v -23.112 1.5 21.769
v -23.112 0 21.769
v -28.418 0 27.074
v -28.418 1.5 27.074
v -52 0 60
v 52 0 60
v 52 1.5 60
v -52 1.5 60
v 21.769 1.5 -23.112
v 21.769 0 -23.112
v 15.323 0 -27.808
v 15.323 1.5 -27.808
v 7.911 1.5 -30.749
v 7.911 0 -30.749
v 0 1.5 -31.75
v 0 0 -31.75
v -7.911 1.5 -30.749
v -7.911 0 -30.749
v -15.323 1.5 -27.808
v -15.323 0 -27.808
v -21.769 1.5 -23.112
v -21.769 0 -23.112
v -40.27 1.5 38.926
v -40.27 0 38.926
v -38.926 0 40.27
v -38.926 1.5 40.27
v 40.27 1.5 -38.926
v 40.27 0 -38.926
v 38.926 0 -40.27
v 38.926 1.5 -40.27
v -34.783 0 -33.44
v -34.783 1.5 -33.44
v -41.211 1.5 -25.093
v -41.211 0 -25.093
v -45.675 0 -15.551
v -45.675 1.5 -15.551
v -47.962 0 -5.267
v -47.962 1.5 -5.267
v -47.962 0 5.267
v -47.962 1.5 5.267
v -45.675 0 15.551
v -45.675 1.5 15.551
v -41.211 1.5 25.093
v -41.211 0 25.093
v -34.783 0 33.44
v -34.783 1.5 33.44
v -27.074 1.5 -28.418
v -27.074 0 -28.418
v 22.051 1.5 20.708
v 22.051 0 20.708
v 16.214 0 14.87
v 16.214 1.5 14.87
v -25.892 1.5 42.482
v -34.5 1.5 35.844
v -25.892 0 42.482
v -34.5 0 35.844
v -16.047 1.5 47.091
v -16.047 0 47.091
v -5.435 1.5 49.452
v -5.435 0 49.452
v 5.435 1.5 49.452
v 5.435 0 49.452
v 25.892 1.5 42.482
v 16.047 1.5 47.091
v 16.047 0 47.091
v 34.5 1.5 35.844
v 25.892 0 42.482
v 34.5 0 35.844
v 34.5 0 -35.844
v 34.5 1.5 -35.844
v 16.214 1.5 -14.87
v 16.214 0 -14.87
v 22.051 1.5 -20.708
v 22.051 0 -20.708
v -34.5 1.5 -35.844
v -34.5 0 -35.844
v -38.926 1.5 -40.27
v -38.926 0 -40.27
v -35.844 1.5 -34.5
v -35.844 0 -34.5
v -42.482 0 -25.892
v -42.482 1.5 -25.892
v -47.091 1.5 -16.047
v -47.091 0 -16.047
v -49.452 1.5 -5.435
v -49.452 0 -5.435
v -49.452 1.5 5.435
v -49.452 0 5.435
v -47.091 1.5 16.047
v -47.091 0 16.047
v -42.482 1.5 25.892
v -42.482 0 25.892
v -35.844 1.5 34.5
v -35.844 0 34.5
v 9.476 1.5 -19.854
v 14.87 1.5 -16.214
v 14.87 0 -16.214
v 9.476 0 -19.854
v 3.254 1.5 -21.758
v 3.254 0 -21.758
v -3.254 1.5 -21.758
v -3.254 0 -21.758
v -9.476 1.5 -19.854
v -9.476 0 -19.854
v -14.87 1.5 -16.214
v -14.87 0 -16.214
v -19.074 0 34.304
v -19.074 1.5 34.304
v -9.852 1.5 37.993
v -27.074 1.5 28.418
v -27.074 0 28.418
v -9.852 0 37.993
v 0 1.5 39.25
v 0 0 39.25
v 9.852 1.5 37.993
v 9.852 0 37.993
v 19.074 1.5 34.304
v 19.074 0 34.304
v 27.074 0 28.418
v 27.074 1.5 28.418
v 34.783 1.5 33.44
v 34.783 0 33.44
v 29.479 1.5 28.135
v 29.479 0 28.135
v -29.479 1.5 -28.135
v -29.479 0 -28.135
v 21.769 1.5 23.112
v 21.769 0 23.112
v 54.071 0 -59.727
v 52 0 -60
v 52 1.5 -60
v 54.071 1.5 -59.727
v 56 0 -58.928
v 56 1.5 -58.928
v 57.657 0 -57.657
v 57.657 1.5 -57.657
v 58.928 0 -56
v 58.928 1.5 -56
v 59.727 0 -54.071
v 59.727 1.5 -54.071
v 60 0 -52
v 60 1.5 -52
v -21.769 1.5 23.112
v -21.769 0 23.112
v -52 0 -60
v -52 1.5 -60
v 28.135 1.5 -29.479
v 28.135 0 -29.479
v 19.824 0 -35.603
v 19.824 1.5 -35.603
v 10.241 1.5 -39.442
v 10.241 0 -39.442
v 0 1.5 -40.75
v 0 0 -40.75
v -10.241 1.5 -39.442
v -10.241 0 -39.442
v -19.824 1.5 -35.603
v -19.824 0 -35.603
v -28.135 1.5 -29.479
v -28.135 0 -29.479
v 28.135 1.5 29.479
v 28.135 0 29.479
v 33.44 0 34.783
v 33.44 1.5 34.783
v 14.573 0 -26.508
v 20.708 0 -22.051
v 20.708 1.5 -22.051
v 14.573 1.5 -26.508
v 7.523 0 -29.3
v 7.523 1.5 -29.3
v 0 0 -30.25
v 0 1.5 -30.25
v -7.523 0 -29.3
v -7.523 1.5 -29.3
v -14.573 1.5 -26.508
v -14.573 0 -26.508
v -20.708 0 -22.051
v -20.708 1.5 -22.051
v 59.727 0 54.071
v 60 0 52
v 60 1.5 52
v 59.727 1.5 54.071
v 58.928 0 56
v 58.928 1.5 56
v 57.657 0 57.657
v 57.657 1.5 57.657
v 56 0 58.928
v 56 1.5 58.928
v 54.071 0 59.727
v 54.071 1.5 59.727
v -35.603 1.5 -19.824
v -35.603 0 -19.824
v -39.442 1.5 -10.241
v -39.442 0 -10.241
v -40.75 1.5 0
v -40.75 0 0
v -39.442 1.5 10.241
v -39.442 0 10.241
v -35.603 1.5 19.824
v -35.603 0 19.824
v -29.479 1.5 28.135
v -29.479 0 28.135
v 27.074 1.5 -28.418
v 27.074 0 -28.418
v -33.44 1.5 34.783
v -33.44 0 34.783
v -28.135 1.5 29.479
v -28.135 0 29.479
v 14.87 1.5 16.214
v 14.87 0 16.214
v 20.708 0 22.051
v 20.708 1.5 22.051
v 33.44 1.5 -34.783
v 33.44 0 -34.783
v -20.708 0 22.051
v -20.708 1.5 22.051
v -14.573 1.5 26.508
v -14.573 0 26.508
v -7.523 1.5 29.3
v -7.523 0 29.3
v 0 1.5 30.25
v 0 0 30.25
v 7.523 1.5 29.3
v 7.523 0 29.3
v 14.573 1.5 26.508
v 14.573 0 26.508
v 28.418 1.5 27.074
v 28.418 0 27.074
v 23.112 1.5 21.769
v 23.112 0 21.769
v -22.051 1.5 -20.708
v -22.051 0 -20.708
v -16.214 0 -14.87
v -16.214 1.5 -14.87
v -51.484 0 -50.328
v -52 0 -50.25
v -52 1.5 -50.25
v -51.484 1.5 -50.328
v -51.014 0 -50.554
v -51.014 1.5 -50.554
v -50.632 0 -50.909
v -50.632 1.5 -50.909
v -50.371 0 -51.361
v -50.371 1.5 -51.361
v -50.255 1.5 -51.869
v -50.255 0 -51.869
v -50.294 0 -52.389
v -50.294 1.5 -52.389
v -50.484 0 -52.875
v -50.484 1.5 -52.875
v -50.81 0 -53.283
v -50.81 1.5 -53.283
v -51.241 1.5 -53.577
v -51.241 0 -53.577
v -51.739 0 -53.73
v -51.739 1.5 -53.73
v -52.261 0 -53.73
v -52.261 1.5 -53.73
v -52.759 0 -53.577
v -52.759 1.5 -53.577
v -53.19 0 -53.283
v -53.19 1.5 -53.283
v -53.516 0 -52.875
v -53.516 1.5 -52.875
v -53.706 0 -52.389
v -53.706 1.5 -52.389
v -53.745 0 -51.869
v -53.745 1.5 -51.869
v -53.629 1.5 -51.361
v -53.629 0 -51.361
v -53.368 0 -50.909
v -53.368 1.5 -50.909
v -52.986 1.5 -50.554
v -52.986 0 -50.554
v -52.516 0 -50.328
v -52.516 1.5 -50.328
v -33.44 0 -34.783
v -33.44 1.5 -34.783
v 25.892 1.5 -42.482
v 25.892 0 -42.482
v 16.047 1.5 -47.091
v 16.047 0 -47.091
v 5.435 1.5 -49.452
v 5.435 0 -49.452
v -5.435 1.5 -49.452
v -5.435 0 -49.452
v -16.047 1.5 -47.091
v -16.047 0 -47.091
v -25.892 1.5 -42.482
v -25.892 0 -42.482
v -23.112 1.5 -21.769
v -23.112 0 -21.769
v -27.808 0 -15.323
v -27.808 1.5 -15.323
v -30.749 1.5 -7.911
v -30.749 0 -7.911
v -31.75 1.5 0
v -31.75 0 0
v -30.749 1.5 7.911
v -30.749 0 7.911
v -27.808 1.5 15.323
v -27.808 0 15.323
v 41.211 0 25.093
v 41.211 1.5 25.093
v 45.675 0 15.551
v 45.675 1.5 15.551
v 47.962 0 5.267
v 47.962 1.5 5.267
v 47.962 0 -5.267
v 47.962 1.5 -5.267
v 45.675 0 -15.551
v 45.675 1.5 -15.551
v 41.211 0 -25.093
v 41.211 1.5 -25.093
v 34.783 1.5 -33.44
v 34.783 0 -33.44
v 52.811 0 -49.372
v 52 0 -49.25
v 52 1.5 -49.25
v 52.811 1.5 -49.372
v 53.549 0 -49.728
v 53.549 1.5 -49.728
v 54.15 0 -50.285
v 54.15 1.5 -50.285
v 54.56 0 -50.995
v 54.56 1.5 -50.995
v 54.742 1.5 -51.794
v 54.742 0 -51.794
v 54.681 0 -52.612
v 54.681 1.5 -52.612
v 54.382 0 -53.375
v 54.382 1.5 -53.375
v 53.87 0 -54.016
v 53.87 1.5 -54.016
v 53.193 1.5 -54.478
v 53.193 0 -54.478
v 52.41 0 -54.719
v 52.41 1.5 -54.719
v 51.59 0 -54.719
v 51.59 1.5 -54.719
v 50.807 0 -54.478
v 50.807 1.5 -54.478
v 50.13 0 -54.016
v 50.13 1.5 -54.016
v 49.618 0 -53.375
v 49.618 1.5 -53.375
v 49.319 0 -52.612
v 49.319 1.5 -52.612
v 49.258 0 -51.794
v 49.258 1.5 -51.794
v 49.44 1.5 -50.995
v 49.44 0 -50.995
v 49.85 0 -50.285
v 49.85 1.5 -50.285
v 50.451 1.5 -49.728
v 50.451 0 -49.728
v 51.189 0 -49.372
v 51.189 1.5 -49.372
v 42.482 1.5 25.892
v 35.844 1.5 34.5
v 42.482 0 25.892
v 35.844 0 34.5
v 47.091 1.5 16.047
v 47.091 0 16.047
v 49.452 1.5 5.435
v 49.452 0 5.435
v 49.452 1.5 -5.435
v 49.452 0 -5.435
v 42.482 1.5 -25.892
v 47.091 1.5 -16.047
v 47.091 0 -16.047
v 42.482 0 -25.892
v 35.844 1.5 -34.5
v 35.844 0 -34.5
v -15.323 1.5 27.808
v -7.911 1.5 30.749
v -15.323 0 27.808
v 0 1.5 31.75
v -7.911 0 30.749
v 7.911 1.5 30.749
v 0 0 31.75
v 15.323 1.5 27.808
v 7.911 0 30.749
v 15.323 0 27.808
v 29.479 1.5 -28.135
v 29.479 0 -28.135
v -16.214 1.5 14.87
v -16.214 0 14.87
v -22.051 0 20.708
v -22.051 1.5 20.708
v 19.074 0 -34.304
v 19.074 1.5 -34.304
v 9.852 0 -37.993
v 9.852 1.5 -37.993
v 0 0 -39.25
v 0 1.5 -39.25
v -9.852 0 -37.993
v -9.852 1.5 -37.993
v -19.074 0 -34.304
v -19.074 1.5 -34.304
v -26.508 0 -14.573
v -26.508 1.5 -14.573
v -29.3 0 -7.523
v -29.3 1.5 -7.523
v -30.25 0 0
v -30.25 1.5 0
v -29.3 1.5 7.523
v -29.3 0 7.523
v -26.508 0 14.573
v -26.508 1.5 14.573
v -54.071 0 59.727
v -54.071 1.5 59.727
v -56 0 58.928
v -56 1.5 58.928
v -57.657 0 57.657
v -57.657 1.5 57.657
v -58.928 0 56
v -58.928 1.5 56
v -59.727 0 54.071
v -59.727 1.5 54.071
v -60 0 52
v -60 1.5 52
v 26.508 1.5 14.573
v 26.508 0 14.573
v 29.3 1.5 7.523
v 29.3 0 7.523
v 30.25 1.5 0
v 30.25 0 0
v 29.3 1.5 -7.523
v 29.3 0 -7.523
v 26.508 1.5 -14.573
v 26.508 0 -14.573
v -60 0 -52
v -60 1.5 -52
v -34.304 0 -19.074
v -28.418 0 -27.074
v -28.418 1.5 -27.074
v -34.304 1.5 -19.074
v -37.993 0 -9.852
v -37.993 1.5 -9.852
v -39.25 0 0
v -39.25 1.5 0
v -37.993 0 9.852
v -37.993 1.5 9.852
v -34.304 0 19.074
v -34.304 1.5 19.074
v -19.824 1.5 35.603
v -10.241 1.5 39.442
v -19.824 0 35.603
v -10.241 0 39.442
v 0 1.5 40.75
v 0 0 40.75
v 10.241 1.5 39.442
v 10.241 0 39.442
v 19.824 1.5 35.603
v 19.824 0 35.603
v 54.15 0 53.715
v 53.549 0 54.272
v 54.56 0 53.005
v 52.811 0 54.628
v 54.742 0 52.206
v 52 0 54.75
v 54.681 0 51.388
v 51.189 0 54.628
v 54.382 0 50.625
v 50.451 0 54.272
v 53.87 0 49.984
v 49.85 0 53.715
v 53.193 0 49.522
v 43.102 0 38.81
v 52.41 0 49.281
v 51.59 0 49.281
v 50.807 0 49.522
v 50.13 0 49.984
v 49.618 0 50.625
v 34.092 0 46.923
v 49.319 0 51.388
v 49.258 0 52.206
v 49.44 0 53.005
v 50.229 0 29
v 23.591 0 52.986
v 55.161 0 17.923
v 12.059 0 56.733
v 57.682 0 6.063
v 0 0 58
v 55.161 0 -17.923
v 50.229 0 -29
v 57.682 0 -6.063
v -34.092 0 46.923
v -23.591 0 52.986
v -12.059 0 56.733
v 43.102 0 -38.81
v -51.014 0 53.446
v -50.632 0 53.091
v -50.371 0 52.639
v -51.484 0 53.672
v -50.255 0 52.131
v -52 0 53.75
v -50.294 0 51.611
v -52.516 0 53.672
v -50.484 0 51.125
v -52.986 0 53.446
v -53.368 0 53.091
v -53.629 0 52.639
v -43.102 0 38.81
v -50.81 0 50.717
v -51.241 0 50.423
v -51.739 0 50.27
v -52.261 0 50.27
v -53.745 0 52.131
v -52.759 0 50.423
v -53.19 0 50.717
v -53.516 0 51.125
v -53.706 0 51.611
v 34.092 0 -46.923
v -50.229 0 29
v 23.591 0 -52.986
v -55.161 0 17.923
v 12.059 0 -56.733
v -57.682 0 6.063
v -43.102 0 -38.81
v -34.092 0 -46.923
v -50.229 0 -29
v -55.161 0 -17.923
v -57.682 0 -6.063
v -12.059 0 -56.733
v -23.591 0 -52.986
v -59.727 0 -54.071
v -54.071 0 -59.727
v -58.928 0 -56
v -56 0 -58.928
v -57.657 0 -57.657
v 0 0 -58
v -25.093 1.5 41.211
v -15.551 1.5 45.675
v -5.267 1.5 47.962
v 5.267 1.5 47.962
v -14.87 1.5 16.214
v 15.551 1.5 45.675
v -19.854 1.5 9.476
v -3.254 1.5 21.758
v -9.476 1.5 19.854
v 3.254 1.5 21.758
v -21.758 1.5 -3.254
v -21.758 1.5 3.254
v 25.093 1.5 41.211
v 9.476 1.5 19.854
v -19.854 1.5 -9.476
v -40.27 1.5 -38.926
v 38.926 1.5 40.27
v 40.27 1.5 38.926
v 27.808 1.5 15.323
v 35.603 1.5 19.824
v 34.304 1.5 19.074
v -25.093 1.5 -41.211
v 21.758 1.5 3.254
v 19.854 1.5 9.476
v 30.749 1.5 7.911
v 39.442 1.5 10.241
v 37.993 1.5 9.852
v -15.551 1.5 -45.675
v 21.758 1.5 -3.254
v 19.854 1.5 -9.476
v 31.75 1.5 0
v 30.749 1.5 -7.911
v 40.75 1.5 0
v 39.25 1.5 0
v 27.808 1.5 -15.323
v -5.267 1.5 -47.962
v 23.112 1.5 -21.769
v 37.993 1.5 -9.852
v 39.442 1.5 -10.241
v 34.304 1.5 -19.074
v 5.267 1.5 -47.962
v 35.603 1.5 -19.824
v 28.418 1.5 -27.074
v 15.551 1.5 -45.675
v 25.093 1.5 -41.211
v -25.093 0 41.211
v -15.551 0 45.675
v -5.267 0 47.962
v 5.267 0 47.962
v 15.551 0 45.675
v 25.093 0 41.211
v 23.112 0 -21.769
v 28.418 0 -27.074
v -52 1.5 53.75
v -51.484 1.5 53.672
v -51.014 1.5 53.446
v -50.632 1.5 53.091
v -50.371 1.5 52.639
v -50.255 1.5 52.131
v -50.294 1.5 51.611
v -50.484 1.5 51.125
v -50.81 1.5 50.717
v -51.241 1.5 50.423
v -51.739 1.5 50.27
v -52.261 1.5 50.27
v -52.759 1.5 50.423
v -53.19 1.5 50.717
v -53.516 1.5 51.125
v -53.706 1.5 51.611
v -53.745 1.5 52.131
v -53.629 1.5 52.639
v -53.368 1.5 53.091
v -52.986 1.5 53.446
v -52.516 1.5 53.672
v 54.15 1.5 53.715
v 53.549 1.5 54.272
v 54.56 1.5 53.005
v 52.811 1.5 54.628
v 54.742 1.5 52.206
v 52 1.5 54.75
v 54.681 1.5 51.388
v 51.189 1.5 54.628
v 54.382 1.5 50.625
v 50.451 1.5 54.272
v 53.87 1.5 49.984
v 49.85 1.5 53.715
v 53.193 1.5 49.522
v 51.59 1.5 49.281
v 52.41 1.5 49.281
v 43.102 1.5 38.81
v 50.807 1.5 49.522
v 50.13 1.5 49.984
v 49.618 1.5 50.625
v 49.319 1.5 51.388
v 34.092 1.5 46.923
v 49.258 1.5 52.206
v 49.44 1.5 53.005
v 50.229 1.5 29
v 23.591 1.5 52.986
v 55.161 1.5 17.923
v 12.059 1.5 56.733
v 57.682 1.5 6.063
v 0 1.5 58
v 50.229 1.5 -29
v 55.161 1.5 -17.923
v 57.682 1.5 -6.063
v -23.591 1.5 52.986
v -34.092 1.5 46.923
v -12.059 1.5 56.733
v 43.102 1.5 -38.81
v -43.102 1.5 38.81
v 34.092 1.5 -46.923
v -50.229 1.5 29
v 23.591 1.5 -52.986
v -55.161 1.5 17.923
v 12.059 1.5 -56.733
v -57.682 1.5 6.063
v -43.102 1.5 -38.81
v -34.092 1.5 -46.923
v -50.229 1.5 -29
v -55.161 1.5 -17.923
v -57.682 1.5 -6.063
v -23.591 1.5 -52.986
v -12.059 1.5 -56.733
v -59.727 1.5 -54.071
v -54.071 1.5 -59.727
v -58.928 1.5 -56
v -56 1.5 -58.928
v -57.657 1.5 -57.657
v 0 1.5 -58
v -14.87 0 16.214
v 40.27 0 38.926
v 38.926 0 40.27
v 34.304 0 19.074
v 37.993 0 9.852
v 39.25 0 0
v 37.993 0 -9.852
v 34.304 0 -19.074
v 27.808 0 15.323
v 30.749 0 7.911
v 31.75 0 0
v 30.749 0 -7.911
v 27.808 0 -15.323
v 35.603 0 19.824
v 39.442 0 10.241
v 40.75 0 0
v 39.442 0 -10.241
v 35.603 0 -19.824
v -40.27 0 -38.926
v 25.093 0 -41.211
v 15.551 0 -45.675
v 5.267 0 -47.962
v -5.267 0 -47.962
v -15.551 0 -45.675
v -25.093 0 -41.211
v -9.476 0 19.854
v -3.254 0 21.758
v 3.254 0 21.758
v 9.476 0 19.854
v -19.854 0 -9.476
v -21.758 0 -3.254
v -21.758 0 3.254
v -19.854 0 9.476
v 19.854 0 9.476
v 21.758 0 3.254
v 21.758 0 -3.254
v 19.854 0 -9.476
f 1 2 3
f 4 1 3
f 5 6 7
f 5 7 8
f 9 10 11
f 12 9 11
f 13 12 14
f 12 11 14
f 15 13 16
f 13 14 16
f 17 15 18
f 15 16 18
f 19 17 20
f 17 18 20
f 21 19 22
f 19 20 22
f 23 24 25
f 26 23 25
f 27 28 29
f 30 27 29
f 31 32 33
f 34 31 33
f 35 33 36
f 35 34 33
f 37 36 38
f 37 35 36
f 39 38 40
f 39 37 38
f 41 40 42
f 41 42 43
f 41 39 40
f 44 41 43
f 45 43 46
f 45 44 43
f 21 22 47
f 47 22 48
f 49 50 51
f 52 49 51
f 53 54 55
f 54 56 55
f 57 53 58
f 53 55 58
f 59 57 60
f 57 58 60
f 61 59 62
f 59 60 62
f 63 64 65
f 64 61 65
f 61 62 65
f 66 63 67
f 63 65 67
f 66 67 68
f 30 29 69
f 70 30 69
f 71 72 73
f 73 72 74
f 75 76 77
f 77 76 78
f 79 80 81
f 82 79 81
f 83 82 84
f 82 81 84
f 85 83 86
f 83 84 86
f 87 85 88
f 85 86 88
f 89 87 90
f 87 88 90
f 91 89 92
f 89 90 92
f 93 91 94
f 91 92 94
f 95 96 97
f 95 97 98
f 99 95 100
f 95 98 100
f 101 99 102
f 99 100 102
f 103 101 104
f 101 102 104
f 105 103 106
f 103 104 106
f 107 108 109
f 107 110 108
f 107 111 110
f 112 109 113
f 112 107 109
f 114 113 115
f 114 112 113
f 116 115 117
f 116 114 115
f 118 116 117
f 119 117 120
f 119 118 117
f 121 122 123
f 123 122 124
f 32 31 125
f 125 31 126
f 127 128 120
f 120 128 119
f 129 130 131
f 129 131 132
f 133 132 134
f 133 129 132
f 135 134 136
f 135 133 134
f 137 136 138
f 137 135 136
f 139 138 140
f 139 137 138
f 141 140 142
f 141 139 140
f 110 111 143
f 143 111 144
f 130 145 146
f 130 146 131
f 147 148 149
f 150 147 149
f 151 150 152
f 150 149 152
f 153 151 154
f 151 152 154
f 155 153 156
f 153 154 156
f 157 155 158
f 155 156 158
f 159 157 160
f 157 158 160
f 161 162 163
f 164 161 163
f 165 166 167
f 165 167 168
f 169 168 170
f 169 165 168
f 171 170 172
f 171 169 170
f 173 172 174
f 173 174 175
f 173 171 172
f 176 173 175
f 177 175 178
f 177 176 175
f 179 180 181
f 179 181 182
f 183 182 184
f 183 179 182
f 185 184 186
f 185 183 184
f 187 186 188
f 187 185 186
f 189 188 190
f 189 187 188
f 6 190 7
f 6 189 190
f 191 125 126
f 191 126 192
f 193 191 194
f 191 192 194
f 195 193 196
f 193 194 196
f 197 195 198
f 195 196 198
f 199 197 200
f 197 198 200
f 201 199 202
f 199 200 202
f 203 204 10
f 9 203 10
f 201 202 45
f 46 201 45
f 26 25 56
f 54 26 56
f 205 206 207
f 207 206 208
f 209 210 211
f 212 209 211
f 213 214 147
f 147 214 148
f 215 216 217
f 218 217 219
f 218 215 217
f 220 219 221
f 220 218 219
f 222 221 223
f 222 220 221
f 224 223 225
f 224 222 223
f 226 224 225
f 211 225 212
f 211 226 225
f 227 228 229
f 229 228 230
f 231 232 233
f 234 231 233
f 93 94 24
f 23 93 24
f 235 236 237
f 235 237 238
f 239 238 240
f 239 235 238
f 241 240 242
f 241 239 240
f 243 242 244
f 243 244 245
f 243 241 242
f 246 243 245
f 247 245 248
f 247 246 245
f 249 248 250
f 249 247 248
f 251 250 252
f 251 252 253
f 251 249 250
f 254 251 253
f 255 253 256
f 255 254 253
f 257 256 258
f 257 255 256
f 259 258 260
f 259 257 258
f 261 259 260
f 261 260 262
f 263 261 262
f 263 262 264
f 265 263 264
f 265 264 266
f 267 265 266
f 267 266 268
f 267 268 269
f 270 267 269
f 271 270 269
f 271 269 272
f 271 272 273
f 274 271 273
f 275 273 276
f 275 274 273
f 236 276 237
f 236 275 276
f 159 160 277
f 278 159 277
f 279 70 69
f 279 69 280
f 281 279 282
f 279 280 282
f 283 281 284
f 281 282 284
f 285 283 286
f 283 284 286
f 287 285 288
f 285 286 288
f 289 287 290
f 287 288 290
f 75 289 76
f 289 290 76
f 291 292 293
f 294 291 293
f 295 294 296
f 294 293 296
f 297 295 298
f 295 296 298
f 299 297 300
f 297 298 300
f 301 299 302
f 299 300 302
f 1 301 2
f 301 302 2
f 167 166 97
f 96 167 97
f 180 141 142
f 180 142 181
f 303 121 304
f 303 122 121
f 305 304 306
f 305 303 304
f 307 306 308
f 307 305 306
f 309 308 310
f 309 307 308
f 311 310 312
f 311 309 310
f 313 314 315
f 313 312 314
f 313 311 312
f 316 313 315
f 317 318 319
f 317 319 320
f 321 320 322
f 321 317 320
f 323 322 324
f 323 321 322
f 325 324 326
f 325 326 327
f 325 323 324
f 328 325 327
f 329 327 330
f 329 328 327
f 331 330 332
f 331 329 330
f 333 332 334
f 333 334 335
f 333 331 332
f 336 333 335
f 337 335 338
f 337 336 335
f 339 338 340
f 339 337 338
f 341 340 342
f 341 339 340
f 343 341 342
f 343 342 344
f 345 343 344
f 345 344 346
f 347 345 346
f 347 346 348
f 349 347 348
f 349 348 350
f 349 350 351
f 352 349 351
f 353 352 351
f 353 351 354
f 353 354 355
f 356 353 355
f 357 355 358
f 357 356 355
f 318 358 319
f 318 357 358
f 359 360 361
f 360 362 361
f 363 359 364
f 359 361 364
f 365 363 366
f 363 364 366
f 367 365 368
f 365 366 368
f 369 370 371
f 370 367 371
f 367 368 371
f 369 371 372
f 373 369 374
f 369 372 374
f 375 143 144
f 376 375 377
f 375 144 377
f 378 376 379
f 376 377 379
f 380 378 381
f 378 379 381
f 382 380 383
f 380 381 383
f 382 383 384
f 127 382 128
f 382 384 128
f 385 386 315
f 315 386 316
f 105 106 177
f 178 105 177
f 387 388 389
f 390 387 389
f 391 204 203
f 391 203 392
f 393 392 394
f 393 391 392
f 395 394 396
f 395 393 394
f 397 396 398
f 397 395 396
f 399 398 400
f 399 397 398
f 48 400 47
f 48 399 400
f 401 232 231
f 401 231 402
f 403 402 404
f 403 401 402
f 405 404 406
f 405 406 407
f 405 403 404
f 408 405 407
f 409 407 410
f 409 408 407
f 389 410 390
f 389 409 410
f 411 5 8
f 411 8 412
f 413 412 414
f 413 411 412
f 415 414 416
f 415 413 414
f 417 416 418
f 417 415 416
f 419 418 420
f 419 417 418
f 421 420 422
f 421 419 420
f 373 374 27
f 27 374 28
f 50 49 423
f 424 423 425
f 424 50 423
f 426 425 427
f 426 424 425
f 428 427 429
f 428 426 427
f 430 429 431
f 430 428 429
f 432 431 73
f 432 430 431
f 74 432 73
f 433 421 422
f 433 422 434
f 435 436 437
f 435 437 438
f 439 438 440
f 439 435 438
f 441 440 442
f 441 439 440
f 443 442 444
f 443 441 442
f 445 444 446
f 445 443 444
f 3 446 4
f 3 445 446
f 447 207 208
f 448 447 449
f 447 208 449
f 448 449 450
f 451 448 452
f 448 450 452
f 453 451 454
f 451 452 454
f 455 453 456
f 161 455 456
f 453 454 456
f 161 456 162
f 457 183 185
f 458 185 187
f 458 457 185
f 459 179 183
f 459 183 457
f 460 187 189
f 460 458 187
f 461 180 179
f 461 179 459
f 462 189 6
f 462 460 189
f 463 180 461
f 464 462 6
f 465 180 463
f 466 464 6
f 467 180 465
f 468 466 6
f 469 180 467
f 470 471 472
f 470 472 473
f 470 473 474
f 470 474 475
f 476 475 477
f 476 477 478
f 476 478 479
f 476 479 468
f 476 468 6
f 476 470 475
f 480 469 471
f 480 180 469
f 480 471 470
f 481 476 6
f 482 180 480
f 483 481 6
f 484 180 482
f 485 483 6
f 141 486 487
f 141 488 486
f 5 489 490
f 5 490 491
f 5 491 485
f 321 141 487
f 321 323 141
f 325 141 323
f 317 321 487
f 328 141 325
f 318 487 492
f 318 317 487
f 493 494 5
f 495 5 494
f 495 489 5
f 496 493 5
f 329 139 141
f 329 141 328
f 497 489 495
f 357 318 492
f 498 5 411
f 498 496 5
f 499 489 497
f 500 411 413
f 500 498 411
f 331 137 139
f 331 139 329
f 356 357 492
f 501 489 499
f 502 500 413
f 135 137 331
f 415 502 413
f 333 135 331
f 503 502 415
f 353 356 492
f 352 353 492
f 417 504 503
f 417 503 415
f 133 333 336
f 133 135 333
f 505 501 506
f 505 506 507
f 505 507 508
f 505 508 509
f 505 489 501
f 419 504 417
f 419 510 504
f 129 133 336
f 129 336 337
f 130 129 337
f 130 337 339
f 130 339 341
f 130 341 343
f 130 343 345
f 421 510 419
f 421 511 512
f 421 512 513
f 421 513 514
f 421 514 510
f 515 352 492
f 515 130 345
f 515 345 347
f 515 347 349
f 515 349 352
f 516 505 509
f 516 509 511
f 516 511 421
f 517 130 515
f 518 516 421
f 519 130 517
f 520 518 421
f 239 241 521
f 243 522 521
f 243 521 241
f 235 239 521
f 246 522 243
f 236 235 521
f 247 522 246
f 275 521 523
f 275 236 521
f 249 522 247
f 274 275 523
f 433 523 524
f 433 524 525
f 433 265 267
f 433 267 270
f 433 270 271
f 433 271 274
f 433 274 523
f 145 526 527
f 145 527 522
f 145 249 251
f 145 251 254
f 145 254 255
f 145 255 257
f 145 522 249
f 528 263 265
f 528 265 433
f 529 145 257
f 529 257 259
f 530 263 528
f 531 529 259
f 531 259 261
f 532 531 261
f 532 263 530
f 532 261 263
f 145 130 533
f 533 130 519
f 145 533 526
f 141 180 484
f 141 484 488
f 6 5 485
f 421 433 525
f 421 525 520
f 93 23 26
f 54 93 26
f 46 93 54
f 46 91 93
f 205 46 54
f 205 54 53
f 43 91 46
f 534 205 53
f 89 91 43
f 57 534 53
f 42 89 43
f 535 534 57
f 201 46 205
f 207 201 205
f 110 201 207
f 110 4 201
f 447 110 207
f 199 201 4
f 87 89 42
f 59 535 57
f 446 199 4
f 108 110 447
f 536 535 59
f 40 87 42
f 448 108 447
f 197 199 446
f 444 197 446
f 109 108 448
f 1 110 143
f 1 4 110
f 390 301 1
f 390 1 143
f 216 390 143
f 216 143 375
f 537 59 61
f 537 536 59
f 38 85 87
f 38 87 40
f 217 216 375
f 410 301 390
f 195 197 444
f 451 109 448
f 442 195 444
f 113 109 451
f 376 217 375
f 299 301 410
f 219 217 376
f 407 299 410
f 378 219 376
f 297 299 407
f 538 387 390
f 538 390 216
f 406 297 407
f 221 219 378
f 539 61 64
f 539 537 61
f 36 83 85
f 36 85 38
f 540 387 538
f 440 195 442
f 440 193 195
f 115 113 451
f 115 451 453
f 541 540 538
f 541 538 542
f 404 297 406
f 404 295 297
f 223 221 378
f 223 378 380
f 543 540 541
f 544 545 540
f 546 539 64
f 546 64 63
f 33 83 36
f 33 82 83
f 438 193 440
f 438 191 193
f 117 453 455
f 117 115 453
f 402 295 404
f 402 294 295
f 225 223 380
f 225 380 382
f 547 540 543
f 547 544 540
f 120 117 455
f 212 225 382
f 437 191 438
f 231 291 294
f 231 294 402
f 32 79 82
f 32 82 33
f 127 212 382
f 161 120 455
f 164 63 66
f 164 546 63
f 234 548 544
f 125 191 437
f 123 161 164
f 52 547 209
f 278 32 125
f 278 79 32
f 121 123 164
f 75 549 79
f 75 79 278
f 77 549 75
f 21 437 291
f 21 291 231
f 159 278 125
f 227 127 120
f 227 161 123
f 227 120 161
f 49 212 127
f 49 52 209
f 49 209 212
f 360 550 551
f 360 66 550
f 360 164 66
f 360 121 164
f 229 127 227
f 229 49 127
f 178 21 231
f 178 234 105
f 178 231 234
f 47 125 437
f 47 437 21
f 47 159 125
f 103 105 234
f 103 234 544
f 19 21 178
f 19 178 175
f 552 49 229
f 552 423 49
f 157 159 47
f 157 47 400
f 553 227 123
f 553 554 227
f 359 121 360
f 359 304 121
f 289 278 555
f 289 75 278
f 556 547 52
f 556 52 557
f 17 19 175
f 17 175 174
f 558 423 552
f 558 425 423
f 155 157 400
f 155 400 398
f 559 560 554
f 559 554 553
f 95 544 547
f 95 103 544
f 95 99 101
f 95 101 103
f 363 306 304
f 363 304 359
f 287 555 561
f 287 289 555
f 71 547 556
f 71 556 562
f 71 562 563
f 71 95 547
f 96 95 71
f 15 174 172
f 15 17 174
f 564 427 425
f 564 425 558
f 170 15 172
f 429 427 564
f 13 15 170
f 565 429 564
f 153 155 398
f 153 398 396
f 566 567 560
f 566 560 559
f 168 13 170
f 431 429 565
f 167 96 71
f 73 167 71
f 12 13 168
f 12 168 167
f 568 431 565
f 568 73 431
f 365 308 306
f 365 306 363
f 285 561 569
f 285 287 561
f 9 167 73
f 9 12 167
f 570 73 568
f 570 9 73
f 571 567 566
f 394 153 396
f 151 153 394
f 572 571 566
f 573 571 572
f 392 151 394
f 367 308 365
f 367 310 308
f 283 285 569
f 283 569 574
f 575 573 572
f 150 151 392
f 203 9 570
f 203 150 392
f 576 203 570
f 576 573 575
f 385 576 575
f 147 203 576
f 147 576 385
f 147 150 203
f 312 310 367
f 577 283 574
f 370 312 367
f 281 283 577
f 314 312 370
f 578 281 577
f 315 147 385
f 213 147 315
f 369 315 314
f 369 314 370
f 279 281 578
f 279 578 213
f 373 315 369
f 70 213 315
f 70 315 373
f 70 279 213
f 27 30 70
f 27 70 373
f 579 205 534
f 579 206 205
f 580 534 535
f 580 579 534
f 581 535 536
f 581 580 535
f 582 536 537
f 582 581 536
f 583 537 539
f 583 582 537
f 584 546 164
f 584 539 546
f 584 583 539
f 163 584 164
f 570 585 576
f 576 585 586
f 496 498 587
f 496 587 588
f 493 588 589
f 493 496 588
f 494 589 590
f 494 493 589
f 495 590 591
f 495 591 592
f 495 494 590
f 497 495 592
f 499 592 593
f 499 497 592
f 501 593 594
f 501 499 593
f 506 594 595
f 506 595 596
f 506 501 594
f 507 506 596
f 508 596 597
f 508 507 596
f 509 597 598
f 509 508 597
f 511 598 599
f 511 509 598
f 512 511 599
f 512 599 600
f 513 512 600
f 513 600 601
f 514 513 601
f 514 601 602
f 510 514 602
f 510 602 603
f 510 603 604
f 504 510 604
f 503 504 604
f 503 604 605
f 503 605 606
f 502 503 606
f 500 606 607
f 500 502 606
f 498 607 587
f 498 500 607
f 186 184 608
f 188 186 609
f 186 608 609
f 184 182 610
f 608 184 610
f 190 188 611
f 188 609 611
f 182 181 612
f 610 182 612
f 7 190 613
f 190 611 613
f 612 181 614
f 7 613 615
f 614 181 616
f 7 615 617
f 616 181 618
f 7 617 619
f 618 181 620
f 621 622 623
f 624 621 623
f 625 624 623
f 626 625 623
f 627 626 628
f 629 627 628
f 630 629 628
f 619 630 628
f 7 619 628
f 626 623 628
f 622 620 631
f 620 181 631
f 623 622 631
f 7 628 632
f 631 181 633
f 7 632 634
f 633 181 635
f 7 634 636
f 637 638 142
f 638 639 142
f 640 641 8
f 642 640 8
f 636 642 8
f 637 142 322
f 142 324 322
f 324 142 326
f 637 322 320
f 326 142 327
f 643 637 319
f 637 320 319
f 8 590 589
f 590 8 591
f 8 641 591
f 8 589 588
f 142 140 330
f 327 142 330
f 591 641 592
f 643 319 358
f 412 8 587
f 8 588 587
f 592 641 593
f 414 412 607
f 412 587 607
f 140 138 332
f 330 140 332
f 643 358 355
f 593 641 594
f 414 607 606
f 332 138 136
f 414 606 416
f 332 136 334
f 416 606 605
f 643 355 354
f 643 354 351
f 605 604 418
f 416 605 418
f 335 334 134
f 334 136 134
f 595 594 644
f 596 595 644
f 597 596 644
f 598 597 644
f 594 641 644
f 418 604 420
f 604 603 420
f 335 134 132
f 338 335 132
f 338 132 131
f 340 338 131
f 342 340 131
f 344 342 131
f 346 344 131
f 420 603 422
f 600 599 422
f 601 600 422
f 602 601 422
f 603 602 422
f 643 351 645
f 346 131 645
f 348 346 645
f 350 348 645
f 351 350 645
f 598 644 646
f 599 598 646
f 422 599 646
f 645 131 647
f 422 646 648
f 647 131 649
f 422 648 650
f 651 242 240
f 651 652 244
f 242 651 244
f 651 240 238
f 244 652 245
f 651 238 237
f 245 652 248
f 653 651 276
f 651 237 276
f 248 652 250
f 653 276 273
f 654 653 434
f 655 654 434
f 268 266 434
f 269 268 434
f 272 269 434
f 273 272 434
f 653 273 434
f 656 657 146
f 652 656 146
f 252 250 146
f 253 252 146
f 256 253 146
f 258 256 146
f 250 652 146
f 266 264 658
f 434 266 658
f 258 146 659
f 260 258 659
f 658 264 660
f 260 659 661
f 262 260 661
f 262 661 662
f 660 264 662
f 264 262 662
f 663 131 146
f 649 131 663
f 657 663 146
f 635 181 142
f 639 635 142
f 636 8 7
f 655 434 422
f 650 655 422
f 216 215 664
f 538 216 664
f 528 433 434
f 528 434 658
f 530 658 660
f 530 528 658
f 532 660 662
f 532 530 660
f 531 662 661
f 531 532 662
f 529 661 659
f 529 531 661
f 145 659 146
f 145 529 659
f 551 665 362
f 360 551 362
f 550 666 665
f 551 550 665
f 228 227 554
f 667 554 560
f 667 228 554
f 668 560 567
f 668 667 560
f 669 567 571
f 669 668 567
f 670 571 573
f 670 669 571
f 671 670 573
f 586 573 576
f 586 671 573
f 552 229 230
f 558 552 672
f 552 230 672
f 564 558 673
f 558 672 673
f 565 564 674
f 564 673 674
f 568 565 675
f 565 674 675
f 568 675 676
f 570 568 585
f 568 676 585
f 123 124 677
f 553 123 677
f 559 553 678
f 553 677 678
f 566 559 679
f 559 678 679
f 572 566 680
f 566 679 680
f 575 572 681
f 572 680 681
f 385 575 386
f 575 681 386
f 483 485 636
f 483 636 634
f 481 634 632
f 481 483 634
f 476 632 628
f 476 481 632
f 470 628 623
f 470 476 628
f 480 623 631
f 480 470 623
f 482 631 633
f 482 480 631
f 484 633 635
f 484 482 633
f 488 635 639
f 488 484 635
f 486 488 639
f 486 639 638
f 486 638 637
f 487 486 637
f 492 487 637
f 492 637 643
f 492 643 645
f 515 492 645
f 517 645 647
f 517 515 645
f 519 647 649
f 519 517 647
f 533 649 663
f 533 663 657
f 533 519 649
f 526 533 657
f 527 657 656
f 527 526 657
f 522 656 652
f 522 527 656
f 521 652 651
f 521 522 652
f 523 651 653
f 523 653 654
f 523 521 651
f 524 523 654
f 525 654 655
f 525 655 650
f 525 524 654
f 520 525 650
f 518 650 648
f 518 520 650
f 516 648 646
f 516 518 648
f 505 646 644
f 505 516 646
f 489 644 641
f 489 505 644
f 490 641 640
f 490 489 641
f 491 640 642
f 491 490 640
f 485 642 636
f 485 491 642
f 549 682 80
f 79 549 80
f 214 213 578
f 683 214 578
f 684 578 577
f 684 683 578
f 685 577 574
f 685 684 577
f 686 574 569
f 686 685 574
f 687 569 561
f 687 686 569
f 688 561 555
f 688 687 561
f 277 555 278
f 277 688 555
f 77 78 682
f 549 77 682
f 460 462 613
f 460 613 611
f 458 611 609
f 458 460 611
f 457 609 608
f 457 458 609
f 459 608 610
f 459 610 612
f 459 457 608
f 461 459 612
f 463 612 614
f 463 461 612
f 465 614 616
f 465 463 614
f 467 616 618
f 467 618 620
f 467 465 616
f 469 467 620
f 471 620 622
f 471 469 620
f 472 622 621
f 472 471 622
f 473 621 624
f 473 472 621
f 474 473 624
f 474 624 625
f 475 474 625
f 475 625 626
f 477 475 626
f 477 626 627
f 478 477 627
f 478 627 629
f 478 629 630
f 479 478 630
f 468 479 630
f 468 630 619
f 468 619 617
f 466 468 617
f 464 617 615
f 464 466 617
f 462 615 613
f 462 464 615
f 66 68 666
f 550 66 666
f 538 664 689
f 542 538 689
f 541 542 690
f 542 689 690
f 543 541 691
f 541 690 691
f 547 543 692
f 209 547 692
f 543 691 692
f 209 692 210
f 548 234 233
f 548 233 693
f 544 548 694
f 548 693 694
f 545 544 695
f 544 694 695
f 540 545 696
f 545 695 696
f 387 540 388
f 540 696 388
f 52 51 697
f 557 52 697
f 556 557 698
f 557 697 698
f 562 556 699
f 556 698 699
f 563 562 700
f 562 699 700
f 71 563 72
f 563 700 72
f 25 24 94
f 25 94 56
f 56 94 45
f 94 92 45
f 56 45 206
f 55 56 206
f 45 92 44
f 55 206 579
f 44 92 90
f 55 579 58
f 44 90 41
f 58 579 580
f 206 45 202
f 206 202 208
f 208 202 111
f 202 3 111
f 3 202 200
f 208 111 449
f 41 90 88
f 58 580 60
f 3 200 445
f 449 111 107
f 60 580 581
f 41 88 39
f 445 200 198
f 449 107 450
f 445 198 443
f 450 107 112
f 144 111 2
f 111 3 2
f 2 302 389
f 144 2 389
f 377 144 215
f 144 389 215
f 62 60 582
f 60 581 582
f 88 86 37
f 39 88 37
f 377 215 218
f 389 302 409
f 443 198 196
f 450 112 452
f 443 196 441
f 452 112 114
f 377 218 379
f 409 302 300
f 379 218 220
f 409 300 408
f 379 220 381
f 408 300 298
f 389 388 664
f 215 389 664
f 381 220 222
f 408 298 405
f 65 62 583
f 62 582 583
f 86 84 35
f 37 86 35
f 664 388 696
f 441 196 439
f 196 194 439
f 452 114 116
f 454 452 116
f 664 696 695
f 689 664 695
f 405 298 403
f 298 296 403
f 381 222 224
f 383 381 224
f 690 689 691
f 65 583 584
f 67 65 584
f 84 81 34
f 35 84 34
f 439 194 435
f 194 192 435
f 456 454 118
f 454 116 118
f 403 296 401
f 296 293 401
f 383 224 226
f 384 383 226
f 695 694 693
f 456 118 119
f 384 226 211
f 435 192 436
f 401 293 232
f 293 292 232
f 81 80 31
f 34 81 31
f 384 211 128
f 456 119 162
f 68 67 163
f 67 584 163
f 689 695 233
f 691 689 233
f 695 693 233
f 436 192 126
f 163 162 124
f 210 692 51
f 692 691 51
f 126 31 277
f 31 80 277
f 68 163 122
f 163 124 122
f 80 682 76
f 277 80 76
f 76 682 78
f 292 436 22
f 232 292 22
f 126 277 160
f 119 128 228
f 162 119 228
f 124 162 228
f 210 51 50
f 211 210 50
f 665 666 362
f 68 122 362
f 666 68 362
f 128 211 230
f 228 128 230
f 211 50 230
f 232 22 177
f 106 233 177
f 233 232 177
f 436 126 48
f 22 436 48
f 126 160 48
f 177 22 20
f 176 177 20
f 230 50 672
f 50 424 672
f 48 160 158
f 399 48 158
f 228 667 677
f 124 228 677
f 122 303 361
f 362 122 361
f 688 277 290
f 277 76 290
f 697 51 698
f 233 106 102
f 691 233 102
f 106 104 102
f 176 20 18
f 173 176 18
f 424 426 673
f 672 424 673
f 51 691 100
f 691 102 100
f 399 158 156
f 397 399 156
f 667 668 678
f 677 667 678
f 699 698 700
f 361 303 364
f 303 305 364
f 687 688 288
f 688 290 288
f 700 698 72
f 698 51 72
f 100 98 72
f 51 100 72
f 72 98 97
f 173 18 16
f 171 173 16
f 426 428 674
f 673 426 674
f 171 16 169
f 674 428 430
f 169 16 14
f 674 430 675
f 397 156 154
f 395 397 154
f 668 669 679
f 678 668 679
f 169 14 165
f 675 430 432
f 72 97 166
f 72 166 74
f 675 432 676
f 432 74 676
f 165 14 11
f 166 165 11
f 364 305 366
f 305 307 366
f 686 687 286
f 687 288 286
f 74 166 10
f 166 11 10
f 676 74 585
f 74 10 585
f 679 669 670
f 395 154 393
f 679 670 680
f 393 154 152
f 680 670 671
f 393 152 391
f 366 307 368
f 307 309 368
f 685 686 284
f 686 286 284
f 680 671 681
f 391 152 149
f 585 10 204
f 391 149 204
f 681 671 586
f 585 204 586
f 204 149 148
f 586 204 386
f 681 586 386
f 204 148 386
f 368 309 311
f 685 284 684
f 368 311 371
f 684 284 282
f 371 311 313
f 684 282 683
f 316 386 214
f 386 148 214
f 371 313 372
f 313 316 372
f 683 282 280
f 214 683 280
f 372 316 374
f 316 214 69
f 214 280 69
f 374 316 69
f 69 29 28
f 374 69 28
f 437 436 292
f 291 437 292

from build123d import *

# Parameters (mm, degrees)
SKETCH_1_R      = 2.75
SKETCH_1_R_2    = 1.75
SKETCH_1_R_3    = 58
EXTRUDE_1_DEPTH = 1.5
SKETCH_2_R      = 22
EXTRUDE_2_DEPTH = 1.5
SKETCH_3_R      = 31.75
SKETCH_3_R_2    = 30.25
EXTRUDE_3_DEPTH = 1.5
SKETCH_4_R      = 40.75
SKETCH_4_R_2    = 39.25
EXTRUDE_4_DEPTH = 1.5
SKETCH_5_R      = 49.75
SKETCH_5_R_2    = 48.25
EXTRUDE_5_DEPTH = 1.5
SKETCH_5_2_R    = 49.75
SKETCH_5_2_R_2  = 48.25
EXTRUDE_6_DEPTH = 1.5
SKETCH_5_3_R    = 49.75
SKETCH_5_3_R_2  = 48.25
EXTRUDE_7_DEPTH = 1.5
EXTRUDE_8_DEPTH = 1.5
EXTRUDE_9_DEPTH = 1.5


with BuildPart() as part:
    # 草图1 → 凸台-拉伸1 (new body)
    with BuildSketch(Plane(origin=(0, 0, 0), x_dir=(1, 0, 0), z_dir=(0, 1, 0))):
        with BuildLine():
            Line((-52, 60), (52, 60))
            ThreePointArc((52, 60), (57.656854249, 57.656854249), (60, 52))
            Line((60, 52), (60, -52))
            ThreePointArc((60, -52), (57.656854249, -57.656854249), (52, -60))
            Line((52, -60), (-52, -60))
            ThreePointArc((-52, -60), (-57.656854249, -57.656854249), (-60, -52))
            Line((-60, -52), (-60, 52))
            ThreePointArc((-60, 52), (-57.656854249, 57.656854249), (-52, 60))
        make_face()
        with Locations((52, 52)):
            Circle(SKETCH_1_R, mode=Mode.SUBTRACT)
        with Locations((52, -52)):
            Circle(SKETCH_1_R, mode=Mode.SUBTRACT)
        with Locations((-52, 52)):
            Circle(SKETCH_1_R_2, mode=Mode.SUBTRACT)
        with Locations((-52, -52)):
            Circle(SKETCH_1_R_2, mode=Mode.SUBTRACT)
        Circle(SKETCH_1_R_3, mode=Mode.SUBTRACT)
    extrude(amount=EXTRUDE_1_DEPTH)


with BuildPart() as body_2:
    # 草图2 → 凸台-拉伸2 (new body)
    with BuildSketch(Plane(origin=(0, 0, 0), x_dir=(1, 0, 0), z_dir=(0, 1, 0))):
        Circle(SKETCH_2_R)
    extrude(amount=EXTRUDE_2_DEPTH)



with BuildPart() as body_3:
    # 草图3 → 凸台-拉伸3 (new body)
    with BuildSketch(Plane(origin=(0, 0, 0), x_dir=(1, 0, 0), z_dir=(0, 1, 0))):
        Circle(SKETCH_3_R)
        Circle(SKETCH_3_R_2, mode=Mode.SUBTRACT)
    extrude(amount=EXTRUDE_3_DEPTH)


with BuildPart() as body_4:
    # 草图4 → 凸台-拉伸4 (new body)
    with BuildSketch(Plane(origin=(0, 0, 0), x_dir=(1, 0, 0), z_dir=(0, 1, 0))):
        Circle(SKETCH_4_R)
        Circle(SKETCH_4_R_2, mode=Mode.SUBTRACT)
    extrude(amount=EXTRUDE_4_DEPTH)


with BuildPart() as body_5:
    # 草图5 → 凸台-拉伸5 (new body)
    with BuildSketch(Plane(origin=(0, 0, 0), x_dir=(1, 0, 0), z_dir=(0, 1, 0))):
        Circle(SKETCH_5_R)
        Circle(SKETCH_5_R_2, mode=Mode.SUBTRACT)
    extrude(amount=EXTRUDE_5_DEPTH)

    # 草图5<2> → 凸台-拉伸6 (add)
    with BuildSketch(Plane(origin=(0, 0, 0), x_dir=(1, 0, 0), z_dir=(0, 1, 0))):
        Circle(SKETCH_5_2_R)
        Circle(SKETCH_5_2_R_2, mode=Mode.SUBTRACT)
    extrude(amount=EXTRUDE_6_DEPTH)

    # 草图5<3> → 凸台-拉伸7 (add)
    with BuildSketch(Plane(origin=(0, 0, 0), x_dir=(1, 0, 0), z_dir=(0, 1, 0))):
        Circle(SKETCH_5_3_R)
        Circle(SKETCH_5_3_R_2, mode=Mode.SUBTRACT)
    extrude(amount=EXTRUDE_7_DEPTH)


with BuildPart() as body_2_1:
    add(body_2.part)

    add(body_3.part)  # 凸台-拉伸8 merges body 3

    add(body_4.part)  # 凸台-拉伸8 merges body 4

    add(body_5.part)  # 凸台-拉伸8 merges body 5
    # 草图8 → 凸台-拉伸8 (add)
    with BuildSketch(Plane(origin=(0, 0, 0), x_dir=(1, 0, 0), z_dir=(0, 1, 0))):
        Polygon((-38.926228304, -40.269731189), (40.269731189, 38.926228304), (38.926228304, 40.269731189), (-40.269731189, -38.926228304), align=None)
    extrude(amount=EXTRUDE_8_DEPTH)

    # 草图9 → 凸台-拉伸9 (add)
    with BuildSketch(Plane(origin=(0, 0, 0), x_dir=(1, 0, 0), z_dir=(0, 1, 0))):
        Polygon((40.269731189, -38.926228304), (-38.926228304, 40.269731189), (-40.269731189, 38.926228304), (38.926228304, -40.269731189), align=None)
    extrude(amount=EXTRUDE_9_DEPTH)


solid = Compound([part.part, body_2_1.part])
